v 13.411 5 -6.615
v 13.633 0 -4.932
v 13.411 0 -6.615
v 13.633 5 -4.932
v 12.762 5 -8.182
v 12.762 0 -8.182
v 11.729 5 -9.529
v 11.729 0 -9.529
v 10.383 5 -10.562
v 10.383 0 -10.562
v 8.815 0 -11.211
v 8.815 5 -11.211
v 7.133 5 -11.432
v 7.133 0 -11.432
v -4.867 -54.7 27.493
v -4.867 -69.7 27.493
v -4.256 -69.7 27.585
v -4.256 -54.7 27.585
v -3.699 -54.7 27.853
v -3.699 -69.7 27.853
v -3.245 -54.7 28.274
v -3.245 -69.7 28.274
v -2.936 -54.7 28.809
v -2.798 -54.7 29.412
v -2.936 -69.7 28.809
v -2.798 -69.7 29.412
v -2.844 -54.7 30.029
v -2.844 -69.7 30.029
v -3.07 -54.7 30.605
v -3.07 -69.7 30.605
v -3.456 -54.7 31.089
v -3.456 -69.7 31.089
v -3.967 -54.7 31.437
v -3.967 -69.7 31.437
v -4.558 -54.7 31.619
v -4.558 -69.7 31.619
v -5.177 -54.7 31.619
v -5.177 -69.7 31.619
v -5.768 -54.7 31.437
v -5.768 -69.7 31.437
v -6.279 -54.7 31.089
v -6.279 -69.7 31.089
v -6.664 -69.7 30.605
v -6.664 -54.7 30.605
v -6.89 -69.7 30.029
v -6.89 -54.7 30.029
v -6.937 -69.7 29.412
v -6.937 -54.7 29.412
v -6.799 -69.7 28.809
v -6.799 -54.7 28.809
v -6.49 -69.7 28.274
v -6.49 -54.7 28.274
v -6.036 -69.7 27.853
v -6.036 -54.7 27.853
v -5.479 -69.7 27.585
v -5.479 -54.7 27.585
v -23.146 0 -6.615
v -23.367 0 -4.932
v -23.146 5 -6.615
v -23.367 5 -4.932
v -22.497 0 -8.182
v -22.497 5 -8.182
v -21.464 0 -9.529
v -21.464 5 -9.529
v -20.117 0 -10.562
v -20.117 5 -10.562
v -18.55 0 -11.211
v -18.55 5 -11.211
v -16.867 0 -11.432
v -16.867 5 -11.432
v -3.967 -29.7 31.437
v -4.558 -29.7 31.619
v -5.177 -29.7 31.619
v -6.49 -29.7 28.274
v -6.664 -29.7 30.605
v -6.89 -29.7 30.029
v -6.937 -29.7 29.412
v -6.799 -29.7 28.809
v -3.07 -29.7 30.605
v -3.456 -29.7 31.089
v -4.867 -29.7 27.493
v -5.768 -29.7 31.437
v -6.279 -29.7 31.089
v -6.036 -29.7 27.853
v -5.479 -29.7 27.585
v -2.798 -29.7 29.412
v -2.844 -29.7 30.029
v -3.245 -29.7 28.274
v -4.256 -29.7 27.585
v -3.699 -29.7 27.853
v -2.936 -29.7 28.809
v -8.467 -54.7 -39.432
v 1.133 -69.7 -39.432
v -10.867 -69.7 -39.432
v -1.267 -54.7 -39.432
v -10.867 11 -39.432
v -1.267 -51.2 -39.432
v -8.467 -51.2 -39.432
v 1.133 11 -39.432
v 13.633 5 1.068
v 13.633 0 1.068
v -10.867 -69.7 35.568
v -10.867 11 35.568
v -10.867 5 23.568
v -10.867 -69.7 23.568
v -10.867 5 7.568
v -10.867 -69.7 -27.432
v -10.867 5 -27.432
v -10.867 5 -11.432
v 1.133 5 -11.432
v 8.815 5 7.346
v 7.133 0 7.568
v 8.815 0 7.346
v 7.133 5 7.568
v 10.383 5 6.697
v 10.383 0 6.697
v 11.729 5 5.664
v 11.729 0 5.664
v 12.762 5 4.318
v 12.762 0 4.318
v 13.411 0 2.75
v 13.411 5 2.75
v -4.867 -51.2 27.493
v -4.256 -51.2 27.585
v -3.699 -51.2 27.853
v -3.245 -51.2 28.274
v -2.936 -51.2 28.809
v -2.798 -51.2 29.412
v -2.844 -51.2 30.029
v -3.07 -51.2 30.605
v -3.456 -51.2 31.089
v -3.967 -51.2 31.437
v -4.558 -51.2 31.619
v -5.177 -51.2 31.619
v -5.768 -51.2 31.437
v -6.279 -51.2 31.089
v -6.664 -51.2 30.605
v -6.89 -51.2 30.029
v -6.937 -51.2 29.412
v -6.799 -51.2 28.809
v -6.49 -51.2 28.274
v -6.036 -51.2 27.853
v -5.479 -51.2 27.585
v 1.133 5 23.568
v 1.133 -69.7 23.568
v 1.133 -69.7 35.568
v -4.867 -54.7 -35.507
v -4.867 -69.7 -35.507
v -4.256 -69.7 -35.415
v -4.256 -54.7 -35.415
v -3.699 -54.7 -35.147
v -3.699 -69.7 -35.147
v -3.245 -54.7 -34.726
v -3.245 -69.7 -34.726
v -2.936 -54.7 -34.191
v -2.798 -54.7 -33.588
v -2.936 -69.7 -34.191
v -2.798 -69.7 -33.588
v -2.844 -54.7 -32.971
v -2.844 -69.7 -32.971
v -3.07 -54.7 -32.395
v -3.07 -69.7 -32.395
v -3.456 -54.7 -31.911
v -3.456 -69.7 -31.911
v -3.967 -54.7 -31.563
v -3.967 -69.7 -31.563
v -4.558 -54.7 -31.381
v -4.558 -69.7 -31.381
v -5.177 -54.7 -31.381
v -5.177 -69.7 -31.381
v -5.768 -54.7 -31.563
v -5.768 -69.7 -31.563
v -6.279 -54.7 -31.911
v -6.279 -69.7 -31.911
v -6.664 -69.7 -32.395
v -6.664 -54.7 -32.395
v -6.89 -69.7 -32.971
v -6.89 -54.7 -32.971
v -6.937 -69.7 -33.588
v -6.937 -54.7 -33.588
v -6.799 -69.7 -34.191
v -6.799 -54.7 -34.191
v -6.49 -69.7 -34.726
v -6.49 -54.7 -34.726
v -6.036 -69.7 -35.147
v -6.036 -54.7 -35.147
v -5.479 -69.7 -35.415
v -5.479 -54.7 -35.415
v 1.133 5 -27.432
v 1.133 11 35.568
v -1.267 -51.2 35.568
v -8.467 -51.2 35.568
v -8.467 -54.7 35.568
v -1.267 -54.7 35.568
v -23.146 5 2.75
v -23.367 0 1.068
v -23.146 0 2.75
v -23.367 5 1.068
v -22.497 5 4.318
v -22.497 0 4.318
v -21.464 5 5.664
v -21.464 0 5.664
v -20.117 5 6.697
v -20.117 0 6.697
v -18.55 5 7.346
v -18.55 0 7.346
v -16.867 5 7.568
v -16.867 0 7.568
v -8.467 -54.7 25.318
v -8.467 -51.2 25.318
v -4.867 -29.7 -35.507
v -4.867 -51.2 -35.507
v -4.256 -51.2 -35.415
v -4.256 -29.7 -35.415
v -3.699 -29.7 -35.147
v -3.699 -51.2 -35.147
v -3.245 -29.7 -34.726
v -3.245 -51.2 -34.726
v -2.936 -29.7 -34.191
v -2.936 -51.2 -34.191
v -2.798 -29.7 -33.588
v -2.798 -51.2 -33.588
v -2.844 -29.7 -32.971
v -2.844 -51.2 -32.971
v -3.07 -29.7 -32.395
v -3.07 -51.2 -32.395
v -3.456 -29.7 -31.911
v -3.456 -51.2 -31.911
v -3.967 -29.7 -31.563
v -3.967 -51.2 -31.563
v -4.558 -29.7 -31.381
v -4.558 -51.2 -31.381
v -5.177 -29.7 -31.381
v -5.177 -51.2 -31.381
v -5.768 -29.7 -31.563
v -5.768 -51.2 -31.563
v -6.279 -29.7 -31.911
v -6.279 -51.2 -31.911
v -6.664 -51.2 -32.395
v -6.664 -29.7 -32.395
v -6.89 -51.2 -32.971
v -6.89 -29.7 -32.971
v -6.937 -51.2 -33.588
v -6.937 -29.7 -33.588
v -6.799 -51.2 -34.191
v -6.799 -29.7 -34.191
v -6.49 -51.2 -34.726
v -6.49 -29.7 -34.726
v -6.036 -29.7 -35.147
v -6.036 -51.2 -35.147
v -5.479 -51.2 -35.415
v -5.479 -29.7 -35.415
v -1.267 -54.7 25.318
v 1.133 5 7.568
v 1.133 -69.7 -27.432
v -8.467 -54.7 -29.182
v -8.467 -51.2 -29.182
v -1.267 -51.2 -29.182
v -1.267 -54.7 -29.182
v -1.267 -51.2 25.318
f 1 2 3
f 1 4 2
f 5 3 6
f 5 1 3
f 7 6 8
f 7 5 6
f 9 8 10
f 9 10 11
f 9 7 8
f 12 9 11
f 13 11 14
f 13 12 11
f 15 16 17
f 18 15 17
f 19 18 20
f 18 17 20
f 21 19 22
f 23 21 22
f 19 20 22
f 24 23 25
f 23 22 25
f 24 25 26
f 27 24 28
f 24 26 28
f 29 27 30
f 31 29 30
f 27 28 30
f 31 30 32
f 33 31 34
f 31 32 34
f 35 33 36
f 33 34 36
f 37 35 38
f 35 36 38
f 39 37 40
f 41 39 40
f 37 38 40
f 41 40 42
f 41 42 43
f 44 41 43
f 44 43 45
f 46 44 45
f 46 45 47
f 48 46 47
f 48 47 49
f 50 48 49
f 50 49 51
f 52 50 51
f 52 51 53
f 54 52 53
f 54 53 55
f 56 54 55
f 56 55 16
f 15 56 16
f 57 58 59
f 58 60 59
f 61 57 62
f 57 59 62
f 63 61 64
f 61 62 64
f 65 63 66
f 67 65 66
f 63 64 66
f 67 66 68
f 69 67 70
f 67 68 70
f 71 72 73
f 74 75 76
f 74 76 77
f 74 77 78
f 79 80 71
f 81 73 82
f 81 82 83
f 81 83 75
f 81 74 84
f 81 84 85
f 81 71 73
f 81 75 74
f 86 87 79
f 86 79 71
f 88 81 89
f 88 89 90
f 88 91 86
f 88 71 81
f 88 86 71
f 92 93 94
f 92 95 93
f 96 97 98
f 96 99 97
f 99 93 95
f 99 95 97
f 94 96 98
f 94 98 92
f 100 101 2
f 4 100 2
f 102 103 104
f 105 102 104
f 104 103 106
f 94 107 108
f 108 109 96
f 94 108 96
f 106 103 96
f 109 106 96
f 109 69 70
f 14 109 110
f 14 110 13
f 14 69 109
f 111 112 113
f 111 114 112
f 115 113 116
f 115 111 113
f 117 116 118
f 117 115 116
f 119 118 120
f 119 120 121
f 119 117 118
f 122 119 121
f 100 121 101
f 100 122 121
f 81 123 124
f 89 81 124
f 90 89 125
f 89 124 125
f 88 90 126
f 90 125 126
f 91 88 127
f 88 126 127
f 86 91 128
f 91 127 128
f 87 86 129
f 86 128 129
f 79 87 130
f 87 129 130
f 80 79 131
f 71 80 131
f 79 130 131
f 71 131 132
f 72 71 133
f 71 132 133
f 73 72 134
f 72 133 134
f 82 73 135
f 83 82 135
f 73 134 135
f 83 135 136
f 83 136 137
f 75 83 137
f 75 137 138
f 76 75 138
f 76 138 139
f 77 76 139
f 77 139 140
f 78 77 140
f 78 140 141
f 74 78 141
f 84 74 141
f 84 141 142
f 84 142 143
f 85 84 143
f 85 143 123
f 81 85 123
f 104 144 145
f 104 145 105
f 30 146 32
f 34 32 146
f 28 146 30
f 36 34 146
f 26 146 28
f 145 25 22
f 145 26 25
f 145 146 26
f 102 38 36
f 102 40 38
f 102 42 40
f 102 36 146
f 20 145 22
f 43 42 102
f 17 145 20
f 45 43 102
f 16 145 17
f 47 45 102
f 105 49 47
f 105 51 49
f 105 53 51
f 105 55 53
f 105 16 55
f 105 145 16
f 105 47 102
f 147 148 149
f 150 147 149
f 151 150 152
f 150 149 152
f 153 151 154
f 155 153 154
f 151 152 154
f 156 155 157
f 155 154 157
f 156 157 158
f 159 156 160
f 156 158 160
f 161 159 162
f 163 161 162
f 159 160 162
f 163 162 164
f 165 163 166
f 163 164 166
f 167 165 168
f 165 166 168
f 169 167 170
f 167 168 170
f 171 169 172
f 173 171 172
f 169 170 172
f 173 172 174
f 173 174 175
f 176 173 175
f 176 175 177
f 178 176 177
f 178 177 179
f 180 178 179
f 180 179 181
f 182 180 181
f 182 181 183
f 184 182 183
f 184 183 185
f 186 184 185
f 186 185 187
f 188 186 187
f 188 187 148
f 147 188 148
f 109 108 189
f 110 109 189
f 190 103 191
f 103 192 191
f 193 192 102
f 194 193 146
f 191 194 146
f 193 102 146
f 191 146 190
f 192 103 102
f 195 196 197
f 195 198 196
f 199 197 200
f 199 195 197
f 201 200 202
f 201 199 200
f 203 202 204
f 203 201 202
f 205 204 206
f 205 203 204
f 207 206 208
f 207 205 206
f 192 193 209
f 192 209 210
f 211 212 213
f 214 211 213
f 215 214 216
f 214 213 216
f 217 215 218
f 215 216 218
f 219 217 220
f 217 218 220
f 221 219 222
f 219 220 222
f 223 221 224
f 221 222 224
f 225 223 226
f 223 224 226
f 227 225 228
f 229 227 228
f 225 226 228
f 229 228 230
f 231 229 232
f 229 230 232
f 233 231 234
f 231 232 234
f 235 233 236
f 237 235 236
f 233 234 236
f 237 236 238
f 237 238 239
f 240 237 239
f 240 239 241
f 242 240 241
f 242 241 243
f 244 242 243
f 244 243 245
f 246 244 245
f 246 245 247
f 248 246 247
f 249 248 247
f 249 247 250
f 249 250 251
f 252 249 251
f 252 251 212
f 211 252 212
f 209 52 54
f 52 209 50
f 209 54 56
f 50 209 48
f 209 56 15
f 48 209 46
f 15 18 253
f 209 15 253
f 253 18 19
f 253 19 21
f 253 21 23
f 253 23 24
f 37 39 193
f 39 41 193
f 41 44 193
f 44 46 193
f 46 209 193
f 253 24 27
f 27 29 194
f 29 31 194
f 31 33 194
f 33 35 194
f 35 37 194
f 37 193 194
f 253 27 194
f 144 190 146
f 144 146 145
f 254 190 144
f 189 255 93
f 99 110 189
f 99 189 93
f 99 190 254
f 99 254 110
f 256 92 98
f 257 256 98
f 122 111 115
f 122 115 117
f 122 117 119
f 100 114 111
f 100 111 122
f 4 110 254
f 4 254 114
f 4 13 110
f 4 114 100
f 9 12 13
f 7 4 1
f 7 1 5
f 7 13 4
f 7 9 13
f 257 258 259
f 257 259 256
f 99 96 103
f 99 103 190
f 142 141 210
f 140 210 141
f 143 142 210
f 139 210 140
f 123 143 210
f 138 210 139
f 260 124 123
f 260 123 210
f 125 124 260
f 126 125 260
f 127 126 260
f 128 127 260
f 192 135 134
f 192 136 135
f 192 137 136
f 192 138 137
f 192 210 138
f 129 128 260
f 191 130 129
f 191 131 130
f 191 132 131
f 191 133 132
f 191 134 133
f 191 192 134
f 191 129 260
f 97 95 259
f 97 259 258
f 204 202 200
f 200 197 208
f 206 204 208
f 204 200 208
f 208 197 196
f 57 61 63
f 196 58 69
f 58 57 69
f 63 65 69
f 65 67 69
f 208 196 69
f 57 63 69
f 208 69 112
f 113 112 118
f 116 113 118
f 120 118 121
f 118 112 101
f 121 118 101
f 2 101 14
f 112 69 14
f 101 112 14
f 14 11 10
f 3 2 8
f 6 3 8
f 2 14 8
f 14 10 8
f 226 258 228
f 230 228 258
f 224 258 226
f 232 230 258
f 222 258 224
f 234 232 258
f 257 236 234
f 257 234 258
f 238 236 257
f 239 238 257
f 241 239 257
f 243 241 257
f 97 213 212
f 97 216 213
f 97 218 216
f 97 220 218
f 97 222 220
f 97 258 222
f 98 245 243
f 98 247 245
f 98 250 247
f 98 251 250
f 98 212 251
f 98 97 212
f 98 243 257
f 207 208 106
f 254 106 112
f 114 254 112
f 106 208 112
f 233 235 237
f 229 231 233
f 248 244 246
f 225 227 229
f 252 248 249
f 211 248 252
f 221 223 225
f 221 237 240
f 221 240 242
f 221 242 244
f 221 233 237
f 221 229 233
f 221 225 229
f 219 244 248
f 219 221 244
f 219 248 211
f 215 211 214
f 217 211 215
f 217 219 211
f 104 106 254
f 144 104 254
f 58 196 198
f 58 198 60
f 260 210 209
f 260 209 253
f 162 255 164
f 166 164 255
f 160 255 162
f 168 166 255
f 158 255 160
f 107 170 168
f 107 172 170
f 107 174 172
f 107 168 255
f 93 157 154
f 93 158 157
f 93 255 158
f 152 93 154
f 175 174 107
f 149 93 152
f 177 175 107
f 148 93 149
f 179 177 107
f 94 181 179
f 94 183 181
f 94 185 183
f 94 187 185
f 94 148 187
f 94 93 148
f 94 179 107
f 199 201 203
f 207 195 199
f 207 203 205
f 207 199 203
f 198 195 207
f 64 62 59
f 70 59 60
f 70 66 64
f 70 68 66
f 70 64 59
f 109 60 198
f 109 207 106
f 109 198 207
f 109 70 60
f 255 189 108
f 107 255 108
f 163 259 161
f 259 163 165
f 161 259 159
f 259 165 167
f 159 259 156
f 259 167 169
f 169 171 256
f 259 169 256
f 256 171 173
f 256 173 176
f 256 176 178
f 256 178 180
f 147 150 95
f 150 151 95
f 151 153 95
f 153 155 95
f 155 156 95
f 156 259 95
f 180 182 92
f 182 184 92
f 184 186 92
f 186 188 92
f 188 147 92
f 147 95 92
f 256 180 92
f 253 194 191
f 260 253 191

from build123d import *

# Parameters (mm, degrees)
ESQUISSE1_W             = 37
ESQUISSE1_H             = 19
BOSS_EXTRU_1_DEPTH      = 5
CONG_1_R                = 6.5
ESQUISSE4_W             = 12
ESQUISSE4_H             = 75
BOSS_EXTRU_2_DEPTH      = 6
ESQUISSE5_W             = 12
ESQUISSE5_H             = 12
BOSS_EXTRU_3_DEPTH      = 74.7
ESQUISSE6_R             = 2.075
ENL_V_MAT_EXTRU_1_DEPTH = 40
ESQUISSE7_W             = 7.2
ESQUISSE7_H             = 3.5
ENL_V_MAT_EXTRU_2_DEPTH = 10.25
ESQUISSE8_W             = 7.2
ESQUISSE8_H             = 3.5
ENL_V_MAT_EXTRU_3_DEPTH = 10.25


with BuildPart() as part:
    # Esquisse1 → Boss.-Extru.1 (new body)
    with BuildSketch(Plane(origin=(0, 0, 0), x_dir=(1, 0, 0), z_dir=(0, 1, 0))):
        with Locations((-4.867406947, 1.932441033)):
            Rectangle(ESQUISSE1_W, ESQUISSE1_H)
    extrude(amount=BOSS_EXTRU_1_DEPTH)

    # Congé1
    cong_1_edges = [part.edges().sort_by_distance(p)[0] for p in [
        (-23.367406947, 2.5, -11.432441033),
        (13.632593053, 2.5, -11.432441033),
        (13.632593053, 2.5, 7.567558967),
        (-23.367406947, 2.5, 7.567558967),
    ]]
    fillet(cong_1_edges, radius=CONG_1_R)

    # Esquisse4 → Boss.-Extru.2 (add)
    with BuildSketch(Plane(origin=(0, 5, 0), x_dir=(1, 0, 0), z_dir=(0, 1, 0))):
        with Locations((-4.867406947, 1.932441033)):
            Rectangle(ESQUISSE4_W, ESQUISSE4_H)
    extrude(amount=BOSS_EXTRU_2_DEPTH)

    # Esquisse5 → Boss.-Extru.3 (add)
    with BuildSketch(Plane(origin=(0, 5, 0), x_dir=(-1, 0, 0), z_dir=(0, -1, 0))):
        with Locations((4.867406947, 33.432441033)):
            Rectangle(ESQUISSE5_W, ESQUISSE5_H)
        with Locations((4.867406947, -29.567558967)):
            Rectangle(ESQUISSE5_W, ESQUISSE5_H)
    extrude(amount=BOSS_EXTRU_3_DEPTH)

    # Esquisse6 → Enlèv. mat.-Extru.1 (cut)
    with BuildSketch(Plane.XZ.offset(69.7)):
        with Locations(Location((-4.867406947, 29.567558967, 0), (0, 0, 270))):
            Circle(ESQUISSE6_R)
        with Locations(Location((-4.867406947, -33.432441033, 0), (0, 0, 270))):
            Circle(ESQUISSE6_R)
    extrude(amount=-ENL_V_MAT_EXTRU_1_DEPTH, mode=Mode.SUBTRACT)

    # Esquisse7 → Enlèv. mat.-Extru.2 (cut)
    with BuildSketch(Plane.XY.offset(35.567558967)):
        with Locations((-4.867406947, -52.95)):
            Rectangle(ESQUISSE7_W, ESQUISSE7_H)
    extrude(amount=-ENL_V_MAT_EXTRU_2_DEPTH, mode=Mode.SUBTRACT)

    # Esquisse8 → Enlèv. mat.-Extru.3 (cut)
    with BuildSketch(Plane(origin=(0, 0, -39.432441033), x_dir=(-1, 0, 0), z_dir=(0, 0, -1))):
        with Locations((4.867406947, -52.95)):
            Rectangle(ESQUISSE8_W, ESQUISSE8_H)
    extrude(amount=-ENL_V_MAT_EXTRU_3_DEPTH, mode=Mode.SUBTRACT)


solid = part.part
